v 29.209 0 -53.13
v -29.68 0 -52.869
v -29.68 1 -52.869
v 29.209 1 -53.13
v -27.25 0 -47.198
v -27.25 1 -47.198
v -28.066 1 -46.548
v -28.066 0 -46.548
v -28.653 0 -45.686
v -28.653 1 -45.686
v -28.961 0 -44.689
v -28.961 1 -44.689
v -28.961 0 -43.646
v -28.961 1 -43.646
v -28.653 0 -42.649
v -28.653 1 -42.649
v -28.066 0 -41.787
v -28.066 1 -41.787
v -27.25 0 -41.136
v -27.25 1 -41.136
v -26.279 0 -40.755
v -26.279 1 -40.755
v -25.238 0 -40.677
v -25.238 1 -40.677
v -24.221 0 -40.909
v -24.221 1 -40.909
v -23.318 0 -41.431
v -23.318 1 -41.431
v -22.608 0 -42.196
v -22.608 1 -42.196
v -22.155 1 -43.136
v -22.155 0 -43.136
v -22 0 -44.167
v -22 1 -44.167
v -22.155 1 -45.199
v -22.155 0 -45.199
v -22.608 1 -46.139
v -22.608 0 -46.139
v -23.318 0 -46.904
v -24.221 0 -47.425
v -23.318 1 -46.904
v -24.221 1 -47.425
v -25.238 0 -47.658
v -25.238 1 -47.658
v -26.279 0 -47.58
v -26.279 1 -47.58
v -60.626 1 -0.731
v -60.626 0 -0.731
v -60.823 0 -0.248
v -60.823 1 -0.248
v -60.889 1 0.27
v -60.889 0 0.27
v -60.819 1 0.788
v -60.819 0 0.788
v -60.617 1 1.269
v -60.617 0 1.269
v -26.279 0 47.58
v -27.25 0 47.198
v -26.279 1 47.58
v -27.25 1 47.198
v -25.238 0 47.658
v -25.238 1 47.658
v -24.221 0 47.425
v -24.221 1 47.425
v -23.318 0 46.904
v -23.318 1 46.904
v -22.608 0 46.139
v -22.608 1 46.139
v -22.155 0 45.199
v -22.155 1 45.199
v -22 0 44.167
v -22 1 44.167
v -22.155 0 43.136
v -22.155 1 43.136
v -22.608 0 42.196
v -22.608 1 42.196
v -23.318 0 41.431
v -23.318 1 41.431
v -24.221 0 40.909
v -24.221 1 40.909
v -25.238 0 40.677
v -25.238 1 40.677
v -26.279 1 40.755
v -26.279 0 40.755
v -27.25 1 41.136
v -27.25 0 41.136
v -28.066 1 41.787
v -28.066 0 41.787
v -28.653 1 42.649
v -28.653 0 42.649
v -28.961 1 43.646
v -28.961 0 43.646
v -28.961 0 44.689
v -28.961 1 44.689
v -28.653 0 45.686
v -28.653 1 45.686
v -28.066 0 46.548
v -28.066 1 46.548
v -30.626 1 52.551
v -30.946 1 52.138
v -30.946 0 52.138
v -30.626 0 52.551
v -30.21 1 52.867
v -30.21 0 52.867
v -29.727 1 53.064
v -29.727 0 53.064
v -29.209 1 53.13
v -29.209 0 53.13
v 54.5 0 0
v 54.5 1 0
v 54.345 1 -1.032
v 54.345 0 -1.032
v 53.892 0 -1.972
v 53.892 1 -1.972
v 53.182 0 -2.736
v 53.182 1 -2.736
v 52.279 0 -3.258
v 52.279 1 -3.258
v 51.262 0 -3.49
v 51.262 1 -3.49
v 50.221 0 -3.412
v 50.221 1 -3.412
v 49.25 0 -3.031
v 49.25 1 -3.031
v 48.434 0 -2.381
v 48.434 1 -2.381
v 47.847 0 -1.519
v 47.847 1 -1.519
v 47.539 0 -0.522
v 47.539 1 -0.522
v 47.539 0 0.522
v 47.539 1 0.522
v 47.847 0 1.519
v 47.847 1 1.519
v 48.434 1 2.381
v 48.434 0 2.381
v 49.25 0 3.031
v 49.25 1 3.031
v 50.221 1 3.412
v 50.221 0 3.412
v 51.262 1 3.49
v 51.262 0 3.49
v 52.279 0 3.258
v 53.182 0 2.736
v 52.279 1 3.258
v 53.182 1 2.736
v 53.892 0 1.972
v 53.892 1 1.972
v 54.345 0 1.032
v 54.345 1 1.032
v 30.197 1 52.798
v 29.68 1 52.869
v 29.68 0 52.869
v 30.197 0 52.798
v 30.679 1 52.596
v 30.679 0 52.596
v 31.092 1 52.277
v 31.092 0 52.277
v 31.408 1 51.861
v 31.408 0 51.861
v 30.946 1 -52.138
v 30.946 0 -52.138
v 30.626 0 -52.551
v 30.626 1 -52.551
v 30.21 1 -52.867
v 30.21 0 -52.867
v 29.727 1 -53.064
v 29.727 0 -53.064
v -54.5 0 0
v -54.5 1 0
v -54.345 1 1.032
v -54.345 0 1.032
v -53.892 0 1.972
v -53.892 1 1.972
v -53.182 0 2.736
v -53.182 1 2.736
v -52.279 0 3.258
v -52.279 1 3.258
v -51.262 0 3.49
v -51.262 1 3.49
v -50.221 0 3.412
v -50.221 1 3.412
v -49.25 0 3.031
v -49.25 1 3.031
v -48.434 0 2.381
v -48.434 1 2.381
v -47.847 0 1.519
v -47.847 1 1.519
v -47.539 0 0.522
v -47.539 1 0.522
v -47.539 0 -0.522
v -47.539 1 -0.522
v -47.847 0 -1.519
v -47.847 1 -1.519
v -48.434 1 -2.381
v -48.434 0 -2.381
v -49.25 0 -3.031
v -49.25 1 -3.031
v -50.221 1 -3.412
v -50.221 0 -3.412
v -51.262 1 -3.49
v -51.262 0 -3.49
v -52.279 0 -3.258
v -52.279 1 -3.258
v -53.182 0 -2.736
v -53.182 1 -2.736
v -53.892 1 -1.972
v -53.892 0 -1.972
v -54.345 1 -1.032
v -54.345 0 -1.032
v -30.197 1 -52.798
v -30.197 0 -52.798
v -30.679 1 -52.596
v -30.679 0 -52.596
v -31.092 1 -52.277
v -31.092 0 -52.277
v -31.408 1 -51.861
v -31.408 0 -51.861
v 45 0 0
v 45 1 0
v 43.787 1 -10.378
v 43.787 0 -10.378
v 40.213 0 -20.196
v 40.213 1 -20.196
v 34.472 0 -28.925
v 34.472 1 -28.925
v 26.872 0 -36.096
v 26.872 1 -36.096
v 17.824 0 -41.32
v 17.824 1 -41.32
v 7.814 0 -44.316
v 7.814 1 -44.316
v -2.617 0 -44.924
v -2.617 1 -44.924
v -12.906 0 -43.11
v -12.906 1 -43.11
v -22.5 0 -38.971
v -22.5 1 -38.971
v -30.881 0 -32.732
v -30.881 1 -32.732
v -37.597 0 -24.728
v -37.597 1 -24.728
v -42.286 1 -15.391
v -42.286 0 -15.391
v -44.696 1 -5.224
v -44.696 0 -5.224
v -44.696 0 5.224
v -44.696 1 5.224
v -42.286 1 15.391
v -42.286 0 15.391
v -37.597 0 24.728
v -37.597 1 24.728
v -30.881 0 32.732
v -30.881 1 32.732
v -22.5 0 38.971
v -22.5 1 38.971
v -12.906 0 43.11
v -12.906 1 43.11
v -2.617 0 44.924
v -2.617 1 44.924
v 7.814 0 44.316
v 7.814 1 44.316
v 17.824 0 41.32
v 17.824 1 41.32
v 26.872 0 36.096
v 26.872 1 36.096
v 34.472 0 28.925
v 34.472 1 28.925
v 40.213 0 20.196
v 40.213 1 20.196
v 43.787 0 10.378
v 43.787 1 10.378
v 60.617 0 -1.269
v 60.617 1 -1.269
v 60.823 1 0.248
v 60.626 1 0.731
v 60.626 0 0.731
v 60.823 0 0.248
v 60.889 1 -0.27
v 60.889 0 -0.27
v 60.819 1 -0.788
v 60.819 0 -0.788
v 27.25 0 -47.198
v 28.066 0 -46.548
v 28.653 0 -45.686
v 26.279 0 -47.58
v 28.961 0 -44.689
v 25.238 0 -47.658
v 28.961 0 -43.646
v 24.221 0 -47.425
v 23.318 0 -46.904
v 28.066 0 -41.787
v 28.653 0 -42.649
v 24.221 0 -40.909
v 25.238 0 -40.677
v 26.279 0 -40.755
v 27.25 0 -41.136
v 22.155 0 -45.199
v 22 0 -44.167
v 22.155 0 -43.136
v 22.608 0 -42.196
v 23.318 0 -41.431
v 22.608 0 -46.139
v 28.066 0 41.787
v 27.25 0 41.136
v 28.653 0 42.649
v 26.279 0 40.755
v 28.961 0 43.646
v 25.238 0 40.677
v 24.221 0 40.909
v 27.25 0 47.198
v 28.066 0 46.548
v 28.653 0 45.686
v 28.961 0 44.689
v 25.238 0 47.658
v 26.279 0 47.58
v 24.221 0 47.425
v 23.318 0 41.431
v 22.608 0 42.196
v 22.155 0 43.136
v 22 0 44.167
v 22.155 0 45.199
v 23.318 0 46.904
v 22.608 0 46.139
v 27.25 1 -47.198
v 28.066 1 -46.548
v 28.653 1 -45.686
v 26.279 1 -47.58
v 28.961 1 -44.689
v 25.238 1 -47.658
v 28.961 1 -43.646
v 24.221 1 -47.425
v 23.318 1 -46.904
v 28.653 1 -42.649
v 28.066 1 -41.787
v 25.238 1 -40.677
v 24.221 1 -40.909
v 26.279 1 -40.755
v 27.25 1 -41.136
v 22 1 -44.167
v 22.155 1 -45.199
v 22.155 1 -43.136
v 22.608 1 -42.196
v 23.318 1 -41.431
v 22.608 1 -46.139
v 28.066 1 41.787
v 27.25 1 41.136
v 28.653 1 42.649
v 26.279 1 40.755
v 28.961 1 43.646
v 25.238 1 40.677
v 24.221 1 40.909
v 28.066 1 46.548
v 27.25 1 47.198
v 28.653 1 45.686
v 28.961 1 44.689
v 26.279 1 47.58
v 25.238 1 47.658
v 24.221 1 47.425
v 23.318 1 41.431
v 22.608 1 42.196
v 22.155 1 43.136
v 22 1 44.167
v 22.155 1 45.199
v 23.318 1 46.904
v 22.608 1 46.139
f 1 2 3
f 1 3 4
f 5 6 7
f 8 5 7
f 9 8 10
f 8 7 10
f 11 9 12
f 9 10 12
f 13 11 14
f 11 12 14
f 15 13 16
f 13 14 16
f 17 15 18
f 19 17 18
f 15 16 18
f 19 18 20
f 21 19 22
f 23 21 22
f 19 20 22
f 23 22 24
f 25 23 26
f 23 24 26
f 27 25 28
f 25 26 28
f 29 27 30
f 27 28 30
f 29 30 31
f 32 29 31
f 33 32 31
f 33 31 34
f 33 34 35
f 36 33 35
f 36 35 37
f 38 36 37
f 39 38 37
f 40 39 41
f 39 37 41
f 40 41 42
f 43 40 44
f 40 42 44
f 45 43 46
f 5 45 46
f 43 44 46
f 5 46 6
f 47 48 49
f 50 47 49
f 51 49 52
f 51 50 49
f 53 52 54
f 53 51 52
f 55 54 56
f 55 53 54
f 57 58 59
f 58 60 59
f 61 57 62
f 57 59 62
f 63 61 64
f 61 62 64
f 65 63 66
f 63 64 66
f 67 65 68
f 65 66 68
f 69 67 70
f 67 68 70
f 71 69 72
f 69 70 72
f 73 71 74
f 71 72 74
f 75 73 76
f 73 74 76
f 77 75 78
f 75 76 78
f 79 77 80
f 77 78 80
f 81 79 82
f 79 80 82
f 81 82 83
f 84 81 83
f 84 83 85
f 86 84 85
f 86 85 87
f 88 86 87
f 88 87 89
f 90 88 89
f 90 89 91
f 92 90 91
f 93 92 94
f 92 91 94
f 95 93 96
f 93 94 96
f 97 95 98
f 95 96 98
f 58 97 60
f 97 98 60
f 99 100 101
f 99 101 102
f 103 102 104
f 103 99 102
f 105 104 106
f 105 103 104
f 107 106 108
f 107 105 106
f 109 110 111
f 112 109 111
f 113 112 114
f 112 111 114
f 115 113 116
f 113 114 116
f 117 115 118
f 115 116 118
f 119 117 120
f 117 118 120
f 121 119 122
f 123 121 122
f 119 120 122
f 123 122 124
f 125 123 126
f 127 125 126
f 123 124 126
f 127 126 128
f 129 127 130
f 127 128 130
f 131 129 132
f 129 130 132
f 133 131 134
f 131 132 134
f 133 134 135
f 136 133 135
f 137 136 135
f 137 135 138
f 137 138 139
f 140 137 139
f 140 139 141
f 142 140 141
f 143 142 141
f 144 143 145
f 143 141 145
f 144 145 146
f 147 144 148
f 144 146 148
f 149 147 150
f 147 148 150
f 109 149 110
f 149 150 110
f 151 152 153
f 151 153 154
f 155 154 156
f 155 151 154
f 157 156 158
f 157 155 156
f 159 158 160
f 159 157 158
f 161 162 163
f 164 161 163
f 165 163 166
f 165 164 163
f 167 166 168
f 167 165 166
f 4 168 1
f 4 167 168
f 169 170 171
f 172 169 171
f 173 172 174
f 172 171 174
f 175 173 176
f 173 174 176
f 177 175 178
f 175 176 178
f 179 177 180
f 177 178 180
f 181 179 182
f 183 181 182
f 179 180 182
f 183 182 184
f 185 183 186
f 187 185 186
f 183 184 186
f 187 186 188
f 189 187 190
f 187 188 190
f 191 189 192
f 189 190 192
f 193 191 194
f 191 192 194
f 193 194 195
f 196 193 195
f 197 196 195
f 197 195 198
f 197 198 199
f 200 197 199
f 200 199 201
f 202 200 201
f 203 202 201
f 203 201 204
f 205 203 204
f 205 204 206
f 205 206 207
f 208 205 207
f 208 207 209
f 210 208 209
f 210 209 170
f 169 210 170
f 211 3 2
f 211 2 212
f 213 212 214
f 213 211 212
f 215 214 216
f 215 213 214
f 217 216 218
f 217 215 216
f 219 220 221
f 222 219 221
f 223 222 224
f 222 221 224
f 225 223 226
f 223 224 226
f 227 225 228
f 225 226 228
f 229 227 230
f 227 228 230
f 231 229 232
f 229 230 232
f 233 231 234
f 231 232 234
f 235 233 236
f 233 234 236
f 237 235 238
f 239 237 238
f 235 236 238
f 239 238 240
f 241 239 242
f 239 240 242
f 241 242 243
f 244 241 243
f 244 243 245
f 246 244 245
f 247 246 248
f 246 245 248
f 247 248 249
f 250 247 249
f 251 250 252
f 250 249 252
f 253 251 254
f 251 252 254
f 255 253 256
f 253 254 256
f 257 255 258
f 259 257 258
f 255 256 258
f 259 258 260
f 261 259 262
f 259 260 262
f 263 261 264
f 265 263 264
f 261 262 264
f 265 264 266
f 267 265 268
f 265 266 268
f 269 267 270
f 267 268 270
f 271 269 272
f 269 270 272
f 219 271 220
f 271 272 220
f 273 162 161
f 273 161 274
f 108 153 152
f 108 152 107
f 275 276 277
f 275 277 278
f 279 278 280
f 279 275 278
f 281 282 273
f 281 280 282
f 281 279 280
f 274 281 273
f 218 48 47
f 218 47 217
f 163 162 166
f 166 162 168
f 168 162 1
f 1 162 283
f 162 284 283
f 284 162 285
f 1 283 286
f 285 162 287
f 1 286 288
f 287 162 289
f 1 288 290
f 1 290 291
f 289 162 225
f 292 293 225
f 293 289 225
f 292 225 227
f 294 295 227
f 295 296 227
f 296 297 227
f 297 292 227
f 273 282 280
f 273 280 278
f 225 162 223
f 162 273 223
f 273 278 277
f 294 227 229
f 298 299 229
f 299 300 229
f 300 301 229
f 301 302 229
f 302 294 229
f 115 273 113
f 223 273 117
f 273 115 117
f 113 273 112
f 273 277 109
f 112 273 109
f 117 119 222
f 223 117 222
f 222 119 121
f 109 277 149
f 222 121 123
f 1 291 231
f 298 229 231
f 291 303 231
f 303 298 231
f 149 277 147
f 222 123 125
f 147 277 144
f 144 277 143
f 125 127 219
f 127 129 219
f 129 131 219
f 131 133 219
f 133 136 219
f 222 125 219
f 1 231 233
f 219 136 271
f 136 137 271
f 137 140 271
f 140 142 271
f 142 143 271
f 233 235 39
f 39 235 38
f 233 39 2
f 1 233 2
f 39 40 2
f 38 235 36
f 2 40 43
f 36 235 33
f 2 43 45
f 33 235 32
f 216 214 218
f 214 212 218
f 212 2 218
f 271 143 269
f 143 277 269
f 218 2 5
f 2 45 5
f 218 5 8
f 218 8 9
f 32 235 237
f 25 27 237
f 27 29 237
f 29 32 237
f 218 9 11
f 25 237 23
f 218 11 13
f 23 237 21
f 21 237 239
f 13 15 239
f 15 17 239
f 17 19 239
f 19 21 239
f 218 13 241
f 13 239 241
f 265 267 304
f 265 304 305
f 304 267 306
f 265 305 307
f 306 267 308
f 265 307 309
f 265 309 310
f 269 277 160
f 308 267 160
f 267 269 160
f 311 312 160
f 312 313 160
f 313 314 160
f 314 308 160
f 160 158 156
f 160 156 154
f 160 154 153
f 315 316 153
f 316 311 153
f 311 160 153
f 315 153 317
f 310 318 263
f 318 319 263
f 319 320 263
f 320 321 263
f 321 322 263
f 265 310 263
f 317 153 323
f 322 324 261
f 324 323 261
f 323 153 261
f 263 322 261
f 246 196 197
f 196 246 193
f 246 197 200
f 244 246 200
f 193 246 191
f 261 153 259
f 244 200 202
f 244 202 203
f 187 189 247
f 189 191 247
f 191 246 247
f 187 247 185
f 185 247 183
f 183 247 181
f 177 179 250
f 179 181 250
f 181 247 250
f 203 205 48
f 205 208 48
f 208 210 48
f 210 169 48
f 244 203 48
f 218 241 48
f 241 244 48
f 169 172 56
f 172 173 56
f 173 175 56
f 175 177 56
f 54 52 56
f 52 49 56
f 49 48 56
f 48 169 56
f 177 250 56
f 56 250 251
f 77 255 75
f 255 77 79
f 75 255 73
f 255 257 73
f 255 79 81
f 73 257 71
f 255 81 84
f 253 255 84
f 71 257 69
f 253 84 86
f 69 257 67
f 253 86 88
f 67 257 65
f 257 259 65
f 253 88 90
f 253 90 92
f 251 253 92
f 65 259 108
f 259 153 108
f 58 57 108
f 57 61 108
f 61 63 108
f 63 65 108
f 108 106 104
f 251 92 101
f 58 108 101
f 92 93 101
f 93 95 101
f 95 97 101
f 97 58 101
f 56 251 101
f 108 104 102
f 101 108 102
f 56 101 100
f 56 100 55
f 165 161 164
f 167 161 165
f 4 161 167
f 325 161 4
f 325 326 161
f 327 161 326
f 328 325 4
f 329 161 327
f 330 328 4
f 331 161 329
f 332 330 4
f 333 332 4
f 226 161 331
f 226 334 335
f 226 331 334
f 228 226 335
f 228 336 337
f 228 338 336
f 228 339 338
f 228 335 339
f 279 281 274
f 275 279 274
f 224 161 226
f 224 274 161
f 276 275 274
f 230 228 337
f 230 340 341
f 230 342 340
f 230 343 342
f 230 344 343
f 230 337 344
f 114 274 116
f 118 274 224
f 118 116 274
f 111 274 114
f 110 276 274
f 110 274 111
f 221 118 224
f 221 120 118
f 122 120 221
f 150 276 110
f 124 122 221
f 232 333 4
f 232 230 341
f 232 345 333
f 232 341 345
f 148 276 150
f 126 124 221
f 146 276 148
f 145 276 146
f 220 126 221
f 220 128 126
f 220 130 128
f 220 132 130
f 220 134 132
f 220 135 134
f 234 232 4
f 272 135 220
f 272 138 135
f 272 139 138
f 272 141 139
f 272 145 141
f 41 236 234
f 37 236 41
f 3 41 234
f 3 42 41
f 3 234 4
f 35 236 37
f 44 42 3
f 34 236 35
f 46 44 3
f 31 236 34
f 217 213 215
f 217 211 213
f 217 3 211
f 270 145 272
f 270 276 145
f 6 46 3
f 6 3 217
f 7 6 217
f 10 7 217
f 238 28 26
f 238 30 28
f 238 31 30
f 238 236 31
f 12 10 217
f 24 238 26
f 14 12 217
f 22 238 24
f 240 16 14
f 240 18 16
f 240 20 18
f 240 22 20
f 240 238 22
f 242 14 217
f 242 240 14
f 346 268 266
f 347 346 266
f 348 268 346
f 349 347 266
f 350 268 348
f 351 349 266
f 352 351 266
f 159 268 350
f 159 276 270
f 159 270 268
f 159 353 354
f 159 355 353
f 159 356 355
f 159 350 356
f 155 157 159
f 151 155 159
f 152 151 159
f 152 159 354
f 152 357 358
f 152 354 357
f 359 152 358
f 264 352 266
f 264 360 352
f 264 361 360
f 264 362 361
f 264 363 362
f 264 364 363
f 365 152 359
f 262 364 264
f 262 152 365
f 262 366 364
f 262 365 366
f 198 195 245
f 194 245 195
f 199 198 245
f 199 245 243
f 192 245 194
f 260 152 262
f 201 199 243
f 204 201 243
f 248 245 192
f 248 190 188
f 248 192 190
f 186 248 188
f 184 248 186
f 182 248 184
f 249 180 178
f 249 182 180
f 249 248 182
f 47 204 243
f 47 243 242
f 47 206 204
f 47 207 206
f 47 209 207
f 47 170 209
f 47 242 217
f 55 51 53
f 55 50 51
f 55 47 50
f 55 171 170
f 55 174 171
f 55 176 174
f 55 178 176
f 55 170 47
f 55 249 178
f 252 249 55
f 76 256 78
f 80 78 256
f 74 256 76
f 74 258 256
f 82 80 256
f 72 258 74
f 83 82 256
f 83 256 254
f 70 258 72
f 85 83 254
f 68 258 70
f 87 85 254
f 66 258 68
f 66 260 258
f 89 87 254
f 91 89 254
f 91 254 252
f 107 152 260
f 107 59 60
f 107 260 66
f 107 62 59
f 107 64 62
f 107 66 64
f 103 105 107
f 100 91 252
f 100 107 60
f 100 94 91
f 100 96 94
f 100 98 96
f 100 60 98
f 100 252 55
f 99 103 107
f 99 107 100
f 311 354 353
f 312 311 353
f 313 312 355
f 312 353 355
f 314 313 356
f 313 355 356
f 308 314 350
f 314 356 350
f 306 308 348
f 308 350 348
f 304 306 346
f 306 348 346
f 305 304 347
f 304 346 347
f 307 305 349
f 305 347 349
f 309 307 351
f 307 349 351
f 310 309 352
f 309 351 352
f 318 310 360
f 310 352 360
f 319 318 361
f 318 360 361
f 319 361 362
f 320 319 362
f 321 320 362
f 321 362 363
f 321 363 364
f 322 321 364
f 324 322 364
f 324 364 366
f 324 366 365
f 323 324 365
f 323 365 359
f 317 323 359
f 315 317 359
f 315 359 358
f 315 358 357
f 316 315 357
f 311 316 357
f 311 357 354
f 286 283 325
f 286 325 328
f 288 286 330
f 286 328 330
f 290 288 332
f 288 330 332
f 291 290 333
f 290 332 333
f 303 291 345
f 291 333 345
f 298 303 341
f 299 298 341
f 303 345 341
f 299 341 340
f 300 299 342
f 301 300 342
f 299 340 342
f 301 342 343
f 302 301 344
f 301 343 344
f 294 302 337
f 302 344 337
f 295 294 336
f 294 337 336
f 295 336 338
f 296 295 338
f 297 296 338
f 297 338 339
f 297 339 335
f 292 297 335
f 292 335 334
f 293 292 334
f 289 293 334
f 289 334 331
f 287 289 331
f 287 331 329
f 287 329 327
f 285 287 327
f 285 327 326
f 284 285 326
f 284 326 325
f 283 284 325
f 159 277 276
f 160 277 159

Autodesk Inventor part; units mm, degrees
ref_plane "YZ Plane" through (0, 0, 0) normal (1, 0, 0) x (0, 1, 0)
ref_plane "XZ Plane" through (0, 0, 0) normal (0, 1, 0) x (-1, 0, 0)
ref_plane "XY Plane" through (0, 0, 0) normal (0, 0, 1) x (1, 0, 0)
sketch "Sketch3" plane through (0, 0, 0) normal (0, 1, 0) x (-1, 0, 0)
  circle A0 centre (0, 0) radius 53
  line L0 (-61.1985, -0.2718) -> (-30.8346, 52.8636)
  line L1 (-30.8346, 52.8636) -> (30.3639, 53.1354)
  line L2 (30.3639, 53.1354) -> (61.1985, 0.2718)
  line L3 (61.1985, 0.2718) -> (30.8346, -52.8636)
  line L4 (30.8346, -52.8636) -> (-30.3639, -53.1354)
  line L5 (-30.3639, -53.1354) -> (-61.1985, -0.2718)
  point P0 (-45.7812, -26.7036)
  dimension "d4" = 106
extrude "Extrusion2" add sketch "Sketch3" along normal blind 1
sketch "Sketch4" plane through (0, 1, 0) normal (0, 1, 0) x (1, 0, 0)
  circle A0 centre (0, 0) radius 45
  dimension "d7" = 90
extrude "Extrusion3" cut sketch "Sketch4" against normal blind 1
sketch "Sketch11" plane through (0, 1, 0) normal (0, 1, 0) x (1, 0, 0)
  line L0 (0, 0) -> (51, 0)
  circle A0 centre (51, 0) radius 3.5
  dimension "d19" = 51
  dimension "d20" = 7
extrude "Extrusion5" cut sketch "Sketch11" against normal blind 10
pattern_circular "Circular Pattern2" count 6 over 360 about axis through (0, 1, 0) along (0, -1, 0) of "Extrusion5"
fillet "Fillet1" radius 2 1 edges at (-30.3639, 0.5, 53.1354)
pattern_circular "Circular Pattern3" count 6 over 360 about axis through (0, 1, 0) along (0, -1, 0) of "Fillet1"
properties part number "crankcase gasket"
